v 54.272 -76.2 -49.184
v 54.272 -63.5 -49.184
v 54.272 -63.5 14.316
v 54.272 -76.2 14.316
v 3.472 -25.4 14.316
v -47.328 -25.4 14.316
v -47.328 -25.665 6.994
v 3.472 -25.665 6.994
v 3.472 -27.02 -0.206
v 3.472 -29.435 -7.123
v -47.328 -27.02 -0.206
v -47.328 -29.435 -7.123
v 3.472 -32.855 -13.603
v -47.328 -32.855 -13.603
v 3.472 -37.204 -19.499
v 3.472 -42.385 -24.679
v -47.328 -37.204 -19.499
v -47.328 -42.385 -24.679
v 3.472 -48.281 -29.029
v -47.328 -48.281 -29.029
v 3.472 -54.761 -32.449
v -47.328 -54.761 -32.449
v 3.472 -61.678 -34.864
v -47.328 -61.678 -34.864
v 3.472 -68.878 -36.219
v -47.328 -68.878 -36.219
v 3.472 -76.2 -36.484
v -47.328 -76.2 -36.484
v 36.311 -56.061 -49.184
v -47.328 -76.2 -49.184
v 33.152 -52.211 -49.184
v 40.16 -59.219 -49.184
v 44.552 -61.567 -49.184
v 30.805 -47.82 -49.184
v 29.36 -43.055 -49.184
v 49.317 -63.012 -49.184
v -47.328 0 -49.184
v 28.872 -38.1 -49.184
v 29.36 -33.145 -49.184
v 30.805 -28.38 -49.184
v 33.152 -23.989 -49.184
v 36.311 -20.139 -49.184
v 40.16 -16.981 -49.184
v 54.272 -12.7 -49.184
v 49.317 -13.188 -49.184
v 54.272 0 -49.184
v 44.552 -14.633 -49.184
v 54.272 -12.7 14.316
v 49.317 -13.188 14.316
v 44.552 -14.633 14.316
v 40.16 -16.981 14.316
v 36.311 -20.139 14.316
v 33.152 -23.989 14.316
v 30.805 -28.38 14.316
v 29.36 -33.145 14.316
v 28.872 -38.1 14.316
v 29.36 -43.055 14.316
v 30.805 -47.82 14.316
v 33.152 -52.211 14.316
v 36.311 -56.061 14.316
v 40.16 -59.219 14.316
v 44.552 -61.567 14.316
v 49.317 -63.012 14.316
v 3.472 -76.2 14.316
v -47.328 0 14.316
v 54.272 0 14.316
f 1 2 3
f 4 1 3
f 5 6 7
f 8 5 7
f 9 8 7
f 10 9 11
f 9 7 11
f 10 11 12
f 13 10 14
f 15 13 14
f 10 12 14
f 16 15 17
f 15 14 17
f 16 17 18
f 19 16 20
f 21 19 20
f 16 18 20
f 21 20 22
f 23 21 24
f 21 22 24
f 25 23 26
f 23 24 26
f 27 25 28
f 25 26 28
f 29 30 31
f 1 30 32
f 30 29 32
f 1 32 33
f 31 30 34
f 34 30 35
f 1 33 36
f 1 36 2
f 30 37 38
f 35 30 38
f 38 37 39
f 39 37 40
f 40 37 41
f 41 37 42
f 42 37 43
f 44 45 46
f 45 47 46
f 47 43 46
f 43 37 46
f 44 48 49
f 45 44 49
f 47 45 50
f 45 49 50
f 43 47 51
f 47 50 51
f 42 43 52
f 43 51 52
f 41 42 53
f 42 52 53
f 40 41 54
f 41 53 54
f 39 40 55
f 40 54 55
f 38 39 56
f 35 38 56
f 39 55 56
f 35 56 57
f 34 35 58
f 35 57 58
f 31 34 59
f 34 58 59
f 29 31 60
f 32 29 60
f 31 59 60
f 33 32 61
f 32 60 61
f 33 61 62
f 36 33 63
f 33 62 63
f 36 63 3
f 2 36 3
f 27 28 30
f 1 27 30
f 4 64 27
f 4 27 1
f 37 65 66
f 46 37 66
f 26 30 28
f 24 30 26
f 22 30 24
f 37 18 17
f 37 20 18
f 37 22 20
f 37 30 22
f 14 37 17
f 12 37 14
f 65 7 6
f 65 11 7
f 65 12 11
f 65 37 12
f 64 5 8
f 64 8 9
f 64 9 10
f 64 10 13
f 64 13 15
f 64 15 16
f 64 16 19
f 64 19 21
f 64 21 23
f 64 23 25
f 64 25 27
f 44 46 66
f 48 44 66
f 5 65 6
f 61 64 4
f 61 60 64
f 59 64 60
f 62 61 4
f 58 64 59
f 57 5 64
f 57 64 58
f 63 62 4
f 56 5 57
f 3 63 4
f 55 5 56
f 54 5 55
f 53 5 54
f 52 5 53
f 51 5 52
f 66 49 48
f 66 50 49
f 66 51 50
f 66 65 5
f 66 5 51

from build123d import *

# Parameters (mm, degrees)
F0_W     = 101.6
F0_H     = 63.5
F1_DEPTH = 76.2
F3_DEPTH = 63.5
F5_DEPTH = 50.8
F7_DEPTH = 50.8


with BuildPart() as f1:
    # F0 (on Front) → F1 (new body)
    with BuildSketch(Plane.XZ):
        with Locations((3.4718271345, -17.4338711586)):
            Rectangle(F0_W, F0_H)
    extrude(amount=F1_DEPTH)

    # F2 (on face) → F3 (cut)
    with BuildSketch(Plane.XY.offset(14.3161288414)):
        with BuildLine():
            Line((54.2718271345, -63.5), (54.2718271345, -12.7))
            ThreePointArc((54.2718271345, -12.7), (28.8718271345, -38.1), (54.2718271345, -63.5))
        make_face()
    extrude(amount=-F3_DEPTH, mode=Mode.SUBTRACT)

    # F4 (on face) → F5 (cut)
    with BuildSketch(Plane(origin=(-47.3281728655, 0, 0), x_dir=(0, -1, 0), z_dir=(-1, 0, 0))):
        with BuildLine():
            ThreePointArc((76.2, -39.4728052417), (114.234520043, -23.7183912016), (129.9889340831, 14.3161288414))
            ThreePointArc((129.9889340831, 14.3161288414), (76.2, 68.1050629246), (22.4110659169, 14.3161288414))
            Line((22.4110659169, 14.3161288414), (76.2, 14.3161288414))
            Line((76.2, 14.3161288414), (76.2, -39.4728052417))
        make_face()
    extrude(amount=-F5_DEPTH, mode=Mode.SUBTRACT)

    # F6 (on face) → F7 (cut)
    with BuildSketch(Plane(origin=(-47.3281728655, 0, 0), x_dir=(0, -1, 0), z_dir=(-1, 0, 0))):
        with BuildLine():
            Line((76.2, 14.3161288414), (25.4, 14.3161288414))
            ThreePointArc((25.4, 14.3161288414), (39.6977680254, -22.1861031331), (76.2, -36.4838711586))
            Line((76.2, -36.4838711586), (76.2, 14.3161288414))
        make_face()
    extrude(amount=-F7_DEPTH, mode=Mode.SUBTRACT)


solid = f1.part
